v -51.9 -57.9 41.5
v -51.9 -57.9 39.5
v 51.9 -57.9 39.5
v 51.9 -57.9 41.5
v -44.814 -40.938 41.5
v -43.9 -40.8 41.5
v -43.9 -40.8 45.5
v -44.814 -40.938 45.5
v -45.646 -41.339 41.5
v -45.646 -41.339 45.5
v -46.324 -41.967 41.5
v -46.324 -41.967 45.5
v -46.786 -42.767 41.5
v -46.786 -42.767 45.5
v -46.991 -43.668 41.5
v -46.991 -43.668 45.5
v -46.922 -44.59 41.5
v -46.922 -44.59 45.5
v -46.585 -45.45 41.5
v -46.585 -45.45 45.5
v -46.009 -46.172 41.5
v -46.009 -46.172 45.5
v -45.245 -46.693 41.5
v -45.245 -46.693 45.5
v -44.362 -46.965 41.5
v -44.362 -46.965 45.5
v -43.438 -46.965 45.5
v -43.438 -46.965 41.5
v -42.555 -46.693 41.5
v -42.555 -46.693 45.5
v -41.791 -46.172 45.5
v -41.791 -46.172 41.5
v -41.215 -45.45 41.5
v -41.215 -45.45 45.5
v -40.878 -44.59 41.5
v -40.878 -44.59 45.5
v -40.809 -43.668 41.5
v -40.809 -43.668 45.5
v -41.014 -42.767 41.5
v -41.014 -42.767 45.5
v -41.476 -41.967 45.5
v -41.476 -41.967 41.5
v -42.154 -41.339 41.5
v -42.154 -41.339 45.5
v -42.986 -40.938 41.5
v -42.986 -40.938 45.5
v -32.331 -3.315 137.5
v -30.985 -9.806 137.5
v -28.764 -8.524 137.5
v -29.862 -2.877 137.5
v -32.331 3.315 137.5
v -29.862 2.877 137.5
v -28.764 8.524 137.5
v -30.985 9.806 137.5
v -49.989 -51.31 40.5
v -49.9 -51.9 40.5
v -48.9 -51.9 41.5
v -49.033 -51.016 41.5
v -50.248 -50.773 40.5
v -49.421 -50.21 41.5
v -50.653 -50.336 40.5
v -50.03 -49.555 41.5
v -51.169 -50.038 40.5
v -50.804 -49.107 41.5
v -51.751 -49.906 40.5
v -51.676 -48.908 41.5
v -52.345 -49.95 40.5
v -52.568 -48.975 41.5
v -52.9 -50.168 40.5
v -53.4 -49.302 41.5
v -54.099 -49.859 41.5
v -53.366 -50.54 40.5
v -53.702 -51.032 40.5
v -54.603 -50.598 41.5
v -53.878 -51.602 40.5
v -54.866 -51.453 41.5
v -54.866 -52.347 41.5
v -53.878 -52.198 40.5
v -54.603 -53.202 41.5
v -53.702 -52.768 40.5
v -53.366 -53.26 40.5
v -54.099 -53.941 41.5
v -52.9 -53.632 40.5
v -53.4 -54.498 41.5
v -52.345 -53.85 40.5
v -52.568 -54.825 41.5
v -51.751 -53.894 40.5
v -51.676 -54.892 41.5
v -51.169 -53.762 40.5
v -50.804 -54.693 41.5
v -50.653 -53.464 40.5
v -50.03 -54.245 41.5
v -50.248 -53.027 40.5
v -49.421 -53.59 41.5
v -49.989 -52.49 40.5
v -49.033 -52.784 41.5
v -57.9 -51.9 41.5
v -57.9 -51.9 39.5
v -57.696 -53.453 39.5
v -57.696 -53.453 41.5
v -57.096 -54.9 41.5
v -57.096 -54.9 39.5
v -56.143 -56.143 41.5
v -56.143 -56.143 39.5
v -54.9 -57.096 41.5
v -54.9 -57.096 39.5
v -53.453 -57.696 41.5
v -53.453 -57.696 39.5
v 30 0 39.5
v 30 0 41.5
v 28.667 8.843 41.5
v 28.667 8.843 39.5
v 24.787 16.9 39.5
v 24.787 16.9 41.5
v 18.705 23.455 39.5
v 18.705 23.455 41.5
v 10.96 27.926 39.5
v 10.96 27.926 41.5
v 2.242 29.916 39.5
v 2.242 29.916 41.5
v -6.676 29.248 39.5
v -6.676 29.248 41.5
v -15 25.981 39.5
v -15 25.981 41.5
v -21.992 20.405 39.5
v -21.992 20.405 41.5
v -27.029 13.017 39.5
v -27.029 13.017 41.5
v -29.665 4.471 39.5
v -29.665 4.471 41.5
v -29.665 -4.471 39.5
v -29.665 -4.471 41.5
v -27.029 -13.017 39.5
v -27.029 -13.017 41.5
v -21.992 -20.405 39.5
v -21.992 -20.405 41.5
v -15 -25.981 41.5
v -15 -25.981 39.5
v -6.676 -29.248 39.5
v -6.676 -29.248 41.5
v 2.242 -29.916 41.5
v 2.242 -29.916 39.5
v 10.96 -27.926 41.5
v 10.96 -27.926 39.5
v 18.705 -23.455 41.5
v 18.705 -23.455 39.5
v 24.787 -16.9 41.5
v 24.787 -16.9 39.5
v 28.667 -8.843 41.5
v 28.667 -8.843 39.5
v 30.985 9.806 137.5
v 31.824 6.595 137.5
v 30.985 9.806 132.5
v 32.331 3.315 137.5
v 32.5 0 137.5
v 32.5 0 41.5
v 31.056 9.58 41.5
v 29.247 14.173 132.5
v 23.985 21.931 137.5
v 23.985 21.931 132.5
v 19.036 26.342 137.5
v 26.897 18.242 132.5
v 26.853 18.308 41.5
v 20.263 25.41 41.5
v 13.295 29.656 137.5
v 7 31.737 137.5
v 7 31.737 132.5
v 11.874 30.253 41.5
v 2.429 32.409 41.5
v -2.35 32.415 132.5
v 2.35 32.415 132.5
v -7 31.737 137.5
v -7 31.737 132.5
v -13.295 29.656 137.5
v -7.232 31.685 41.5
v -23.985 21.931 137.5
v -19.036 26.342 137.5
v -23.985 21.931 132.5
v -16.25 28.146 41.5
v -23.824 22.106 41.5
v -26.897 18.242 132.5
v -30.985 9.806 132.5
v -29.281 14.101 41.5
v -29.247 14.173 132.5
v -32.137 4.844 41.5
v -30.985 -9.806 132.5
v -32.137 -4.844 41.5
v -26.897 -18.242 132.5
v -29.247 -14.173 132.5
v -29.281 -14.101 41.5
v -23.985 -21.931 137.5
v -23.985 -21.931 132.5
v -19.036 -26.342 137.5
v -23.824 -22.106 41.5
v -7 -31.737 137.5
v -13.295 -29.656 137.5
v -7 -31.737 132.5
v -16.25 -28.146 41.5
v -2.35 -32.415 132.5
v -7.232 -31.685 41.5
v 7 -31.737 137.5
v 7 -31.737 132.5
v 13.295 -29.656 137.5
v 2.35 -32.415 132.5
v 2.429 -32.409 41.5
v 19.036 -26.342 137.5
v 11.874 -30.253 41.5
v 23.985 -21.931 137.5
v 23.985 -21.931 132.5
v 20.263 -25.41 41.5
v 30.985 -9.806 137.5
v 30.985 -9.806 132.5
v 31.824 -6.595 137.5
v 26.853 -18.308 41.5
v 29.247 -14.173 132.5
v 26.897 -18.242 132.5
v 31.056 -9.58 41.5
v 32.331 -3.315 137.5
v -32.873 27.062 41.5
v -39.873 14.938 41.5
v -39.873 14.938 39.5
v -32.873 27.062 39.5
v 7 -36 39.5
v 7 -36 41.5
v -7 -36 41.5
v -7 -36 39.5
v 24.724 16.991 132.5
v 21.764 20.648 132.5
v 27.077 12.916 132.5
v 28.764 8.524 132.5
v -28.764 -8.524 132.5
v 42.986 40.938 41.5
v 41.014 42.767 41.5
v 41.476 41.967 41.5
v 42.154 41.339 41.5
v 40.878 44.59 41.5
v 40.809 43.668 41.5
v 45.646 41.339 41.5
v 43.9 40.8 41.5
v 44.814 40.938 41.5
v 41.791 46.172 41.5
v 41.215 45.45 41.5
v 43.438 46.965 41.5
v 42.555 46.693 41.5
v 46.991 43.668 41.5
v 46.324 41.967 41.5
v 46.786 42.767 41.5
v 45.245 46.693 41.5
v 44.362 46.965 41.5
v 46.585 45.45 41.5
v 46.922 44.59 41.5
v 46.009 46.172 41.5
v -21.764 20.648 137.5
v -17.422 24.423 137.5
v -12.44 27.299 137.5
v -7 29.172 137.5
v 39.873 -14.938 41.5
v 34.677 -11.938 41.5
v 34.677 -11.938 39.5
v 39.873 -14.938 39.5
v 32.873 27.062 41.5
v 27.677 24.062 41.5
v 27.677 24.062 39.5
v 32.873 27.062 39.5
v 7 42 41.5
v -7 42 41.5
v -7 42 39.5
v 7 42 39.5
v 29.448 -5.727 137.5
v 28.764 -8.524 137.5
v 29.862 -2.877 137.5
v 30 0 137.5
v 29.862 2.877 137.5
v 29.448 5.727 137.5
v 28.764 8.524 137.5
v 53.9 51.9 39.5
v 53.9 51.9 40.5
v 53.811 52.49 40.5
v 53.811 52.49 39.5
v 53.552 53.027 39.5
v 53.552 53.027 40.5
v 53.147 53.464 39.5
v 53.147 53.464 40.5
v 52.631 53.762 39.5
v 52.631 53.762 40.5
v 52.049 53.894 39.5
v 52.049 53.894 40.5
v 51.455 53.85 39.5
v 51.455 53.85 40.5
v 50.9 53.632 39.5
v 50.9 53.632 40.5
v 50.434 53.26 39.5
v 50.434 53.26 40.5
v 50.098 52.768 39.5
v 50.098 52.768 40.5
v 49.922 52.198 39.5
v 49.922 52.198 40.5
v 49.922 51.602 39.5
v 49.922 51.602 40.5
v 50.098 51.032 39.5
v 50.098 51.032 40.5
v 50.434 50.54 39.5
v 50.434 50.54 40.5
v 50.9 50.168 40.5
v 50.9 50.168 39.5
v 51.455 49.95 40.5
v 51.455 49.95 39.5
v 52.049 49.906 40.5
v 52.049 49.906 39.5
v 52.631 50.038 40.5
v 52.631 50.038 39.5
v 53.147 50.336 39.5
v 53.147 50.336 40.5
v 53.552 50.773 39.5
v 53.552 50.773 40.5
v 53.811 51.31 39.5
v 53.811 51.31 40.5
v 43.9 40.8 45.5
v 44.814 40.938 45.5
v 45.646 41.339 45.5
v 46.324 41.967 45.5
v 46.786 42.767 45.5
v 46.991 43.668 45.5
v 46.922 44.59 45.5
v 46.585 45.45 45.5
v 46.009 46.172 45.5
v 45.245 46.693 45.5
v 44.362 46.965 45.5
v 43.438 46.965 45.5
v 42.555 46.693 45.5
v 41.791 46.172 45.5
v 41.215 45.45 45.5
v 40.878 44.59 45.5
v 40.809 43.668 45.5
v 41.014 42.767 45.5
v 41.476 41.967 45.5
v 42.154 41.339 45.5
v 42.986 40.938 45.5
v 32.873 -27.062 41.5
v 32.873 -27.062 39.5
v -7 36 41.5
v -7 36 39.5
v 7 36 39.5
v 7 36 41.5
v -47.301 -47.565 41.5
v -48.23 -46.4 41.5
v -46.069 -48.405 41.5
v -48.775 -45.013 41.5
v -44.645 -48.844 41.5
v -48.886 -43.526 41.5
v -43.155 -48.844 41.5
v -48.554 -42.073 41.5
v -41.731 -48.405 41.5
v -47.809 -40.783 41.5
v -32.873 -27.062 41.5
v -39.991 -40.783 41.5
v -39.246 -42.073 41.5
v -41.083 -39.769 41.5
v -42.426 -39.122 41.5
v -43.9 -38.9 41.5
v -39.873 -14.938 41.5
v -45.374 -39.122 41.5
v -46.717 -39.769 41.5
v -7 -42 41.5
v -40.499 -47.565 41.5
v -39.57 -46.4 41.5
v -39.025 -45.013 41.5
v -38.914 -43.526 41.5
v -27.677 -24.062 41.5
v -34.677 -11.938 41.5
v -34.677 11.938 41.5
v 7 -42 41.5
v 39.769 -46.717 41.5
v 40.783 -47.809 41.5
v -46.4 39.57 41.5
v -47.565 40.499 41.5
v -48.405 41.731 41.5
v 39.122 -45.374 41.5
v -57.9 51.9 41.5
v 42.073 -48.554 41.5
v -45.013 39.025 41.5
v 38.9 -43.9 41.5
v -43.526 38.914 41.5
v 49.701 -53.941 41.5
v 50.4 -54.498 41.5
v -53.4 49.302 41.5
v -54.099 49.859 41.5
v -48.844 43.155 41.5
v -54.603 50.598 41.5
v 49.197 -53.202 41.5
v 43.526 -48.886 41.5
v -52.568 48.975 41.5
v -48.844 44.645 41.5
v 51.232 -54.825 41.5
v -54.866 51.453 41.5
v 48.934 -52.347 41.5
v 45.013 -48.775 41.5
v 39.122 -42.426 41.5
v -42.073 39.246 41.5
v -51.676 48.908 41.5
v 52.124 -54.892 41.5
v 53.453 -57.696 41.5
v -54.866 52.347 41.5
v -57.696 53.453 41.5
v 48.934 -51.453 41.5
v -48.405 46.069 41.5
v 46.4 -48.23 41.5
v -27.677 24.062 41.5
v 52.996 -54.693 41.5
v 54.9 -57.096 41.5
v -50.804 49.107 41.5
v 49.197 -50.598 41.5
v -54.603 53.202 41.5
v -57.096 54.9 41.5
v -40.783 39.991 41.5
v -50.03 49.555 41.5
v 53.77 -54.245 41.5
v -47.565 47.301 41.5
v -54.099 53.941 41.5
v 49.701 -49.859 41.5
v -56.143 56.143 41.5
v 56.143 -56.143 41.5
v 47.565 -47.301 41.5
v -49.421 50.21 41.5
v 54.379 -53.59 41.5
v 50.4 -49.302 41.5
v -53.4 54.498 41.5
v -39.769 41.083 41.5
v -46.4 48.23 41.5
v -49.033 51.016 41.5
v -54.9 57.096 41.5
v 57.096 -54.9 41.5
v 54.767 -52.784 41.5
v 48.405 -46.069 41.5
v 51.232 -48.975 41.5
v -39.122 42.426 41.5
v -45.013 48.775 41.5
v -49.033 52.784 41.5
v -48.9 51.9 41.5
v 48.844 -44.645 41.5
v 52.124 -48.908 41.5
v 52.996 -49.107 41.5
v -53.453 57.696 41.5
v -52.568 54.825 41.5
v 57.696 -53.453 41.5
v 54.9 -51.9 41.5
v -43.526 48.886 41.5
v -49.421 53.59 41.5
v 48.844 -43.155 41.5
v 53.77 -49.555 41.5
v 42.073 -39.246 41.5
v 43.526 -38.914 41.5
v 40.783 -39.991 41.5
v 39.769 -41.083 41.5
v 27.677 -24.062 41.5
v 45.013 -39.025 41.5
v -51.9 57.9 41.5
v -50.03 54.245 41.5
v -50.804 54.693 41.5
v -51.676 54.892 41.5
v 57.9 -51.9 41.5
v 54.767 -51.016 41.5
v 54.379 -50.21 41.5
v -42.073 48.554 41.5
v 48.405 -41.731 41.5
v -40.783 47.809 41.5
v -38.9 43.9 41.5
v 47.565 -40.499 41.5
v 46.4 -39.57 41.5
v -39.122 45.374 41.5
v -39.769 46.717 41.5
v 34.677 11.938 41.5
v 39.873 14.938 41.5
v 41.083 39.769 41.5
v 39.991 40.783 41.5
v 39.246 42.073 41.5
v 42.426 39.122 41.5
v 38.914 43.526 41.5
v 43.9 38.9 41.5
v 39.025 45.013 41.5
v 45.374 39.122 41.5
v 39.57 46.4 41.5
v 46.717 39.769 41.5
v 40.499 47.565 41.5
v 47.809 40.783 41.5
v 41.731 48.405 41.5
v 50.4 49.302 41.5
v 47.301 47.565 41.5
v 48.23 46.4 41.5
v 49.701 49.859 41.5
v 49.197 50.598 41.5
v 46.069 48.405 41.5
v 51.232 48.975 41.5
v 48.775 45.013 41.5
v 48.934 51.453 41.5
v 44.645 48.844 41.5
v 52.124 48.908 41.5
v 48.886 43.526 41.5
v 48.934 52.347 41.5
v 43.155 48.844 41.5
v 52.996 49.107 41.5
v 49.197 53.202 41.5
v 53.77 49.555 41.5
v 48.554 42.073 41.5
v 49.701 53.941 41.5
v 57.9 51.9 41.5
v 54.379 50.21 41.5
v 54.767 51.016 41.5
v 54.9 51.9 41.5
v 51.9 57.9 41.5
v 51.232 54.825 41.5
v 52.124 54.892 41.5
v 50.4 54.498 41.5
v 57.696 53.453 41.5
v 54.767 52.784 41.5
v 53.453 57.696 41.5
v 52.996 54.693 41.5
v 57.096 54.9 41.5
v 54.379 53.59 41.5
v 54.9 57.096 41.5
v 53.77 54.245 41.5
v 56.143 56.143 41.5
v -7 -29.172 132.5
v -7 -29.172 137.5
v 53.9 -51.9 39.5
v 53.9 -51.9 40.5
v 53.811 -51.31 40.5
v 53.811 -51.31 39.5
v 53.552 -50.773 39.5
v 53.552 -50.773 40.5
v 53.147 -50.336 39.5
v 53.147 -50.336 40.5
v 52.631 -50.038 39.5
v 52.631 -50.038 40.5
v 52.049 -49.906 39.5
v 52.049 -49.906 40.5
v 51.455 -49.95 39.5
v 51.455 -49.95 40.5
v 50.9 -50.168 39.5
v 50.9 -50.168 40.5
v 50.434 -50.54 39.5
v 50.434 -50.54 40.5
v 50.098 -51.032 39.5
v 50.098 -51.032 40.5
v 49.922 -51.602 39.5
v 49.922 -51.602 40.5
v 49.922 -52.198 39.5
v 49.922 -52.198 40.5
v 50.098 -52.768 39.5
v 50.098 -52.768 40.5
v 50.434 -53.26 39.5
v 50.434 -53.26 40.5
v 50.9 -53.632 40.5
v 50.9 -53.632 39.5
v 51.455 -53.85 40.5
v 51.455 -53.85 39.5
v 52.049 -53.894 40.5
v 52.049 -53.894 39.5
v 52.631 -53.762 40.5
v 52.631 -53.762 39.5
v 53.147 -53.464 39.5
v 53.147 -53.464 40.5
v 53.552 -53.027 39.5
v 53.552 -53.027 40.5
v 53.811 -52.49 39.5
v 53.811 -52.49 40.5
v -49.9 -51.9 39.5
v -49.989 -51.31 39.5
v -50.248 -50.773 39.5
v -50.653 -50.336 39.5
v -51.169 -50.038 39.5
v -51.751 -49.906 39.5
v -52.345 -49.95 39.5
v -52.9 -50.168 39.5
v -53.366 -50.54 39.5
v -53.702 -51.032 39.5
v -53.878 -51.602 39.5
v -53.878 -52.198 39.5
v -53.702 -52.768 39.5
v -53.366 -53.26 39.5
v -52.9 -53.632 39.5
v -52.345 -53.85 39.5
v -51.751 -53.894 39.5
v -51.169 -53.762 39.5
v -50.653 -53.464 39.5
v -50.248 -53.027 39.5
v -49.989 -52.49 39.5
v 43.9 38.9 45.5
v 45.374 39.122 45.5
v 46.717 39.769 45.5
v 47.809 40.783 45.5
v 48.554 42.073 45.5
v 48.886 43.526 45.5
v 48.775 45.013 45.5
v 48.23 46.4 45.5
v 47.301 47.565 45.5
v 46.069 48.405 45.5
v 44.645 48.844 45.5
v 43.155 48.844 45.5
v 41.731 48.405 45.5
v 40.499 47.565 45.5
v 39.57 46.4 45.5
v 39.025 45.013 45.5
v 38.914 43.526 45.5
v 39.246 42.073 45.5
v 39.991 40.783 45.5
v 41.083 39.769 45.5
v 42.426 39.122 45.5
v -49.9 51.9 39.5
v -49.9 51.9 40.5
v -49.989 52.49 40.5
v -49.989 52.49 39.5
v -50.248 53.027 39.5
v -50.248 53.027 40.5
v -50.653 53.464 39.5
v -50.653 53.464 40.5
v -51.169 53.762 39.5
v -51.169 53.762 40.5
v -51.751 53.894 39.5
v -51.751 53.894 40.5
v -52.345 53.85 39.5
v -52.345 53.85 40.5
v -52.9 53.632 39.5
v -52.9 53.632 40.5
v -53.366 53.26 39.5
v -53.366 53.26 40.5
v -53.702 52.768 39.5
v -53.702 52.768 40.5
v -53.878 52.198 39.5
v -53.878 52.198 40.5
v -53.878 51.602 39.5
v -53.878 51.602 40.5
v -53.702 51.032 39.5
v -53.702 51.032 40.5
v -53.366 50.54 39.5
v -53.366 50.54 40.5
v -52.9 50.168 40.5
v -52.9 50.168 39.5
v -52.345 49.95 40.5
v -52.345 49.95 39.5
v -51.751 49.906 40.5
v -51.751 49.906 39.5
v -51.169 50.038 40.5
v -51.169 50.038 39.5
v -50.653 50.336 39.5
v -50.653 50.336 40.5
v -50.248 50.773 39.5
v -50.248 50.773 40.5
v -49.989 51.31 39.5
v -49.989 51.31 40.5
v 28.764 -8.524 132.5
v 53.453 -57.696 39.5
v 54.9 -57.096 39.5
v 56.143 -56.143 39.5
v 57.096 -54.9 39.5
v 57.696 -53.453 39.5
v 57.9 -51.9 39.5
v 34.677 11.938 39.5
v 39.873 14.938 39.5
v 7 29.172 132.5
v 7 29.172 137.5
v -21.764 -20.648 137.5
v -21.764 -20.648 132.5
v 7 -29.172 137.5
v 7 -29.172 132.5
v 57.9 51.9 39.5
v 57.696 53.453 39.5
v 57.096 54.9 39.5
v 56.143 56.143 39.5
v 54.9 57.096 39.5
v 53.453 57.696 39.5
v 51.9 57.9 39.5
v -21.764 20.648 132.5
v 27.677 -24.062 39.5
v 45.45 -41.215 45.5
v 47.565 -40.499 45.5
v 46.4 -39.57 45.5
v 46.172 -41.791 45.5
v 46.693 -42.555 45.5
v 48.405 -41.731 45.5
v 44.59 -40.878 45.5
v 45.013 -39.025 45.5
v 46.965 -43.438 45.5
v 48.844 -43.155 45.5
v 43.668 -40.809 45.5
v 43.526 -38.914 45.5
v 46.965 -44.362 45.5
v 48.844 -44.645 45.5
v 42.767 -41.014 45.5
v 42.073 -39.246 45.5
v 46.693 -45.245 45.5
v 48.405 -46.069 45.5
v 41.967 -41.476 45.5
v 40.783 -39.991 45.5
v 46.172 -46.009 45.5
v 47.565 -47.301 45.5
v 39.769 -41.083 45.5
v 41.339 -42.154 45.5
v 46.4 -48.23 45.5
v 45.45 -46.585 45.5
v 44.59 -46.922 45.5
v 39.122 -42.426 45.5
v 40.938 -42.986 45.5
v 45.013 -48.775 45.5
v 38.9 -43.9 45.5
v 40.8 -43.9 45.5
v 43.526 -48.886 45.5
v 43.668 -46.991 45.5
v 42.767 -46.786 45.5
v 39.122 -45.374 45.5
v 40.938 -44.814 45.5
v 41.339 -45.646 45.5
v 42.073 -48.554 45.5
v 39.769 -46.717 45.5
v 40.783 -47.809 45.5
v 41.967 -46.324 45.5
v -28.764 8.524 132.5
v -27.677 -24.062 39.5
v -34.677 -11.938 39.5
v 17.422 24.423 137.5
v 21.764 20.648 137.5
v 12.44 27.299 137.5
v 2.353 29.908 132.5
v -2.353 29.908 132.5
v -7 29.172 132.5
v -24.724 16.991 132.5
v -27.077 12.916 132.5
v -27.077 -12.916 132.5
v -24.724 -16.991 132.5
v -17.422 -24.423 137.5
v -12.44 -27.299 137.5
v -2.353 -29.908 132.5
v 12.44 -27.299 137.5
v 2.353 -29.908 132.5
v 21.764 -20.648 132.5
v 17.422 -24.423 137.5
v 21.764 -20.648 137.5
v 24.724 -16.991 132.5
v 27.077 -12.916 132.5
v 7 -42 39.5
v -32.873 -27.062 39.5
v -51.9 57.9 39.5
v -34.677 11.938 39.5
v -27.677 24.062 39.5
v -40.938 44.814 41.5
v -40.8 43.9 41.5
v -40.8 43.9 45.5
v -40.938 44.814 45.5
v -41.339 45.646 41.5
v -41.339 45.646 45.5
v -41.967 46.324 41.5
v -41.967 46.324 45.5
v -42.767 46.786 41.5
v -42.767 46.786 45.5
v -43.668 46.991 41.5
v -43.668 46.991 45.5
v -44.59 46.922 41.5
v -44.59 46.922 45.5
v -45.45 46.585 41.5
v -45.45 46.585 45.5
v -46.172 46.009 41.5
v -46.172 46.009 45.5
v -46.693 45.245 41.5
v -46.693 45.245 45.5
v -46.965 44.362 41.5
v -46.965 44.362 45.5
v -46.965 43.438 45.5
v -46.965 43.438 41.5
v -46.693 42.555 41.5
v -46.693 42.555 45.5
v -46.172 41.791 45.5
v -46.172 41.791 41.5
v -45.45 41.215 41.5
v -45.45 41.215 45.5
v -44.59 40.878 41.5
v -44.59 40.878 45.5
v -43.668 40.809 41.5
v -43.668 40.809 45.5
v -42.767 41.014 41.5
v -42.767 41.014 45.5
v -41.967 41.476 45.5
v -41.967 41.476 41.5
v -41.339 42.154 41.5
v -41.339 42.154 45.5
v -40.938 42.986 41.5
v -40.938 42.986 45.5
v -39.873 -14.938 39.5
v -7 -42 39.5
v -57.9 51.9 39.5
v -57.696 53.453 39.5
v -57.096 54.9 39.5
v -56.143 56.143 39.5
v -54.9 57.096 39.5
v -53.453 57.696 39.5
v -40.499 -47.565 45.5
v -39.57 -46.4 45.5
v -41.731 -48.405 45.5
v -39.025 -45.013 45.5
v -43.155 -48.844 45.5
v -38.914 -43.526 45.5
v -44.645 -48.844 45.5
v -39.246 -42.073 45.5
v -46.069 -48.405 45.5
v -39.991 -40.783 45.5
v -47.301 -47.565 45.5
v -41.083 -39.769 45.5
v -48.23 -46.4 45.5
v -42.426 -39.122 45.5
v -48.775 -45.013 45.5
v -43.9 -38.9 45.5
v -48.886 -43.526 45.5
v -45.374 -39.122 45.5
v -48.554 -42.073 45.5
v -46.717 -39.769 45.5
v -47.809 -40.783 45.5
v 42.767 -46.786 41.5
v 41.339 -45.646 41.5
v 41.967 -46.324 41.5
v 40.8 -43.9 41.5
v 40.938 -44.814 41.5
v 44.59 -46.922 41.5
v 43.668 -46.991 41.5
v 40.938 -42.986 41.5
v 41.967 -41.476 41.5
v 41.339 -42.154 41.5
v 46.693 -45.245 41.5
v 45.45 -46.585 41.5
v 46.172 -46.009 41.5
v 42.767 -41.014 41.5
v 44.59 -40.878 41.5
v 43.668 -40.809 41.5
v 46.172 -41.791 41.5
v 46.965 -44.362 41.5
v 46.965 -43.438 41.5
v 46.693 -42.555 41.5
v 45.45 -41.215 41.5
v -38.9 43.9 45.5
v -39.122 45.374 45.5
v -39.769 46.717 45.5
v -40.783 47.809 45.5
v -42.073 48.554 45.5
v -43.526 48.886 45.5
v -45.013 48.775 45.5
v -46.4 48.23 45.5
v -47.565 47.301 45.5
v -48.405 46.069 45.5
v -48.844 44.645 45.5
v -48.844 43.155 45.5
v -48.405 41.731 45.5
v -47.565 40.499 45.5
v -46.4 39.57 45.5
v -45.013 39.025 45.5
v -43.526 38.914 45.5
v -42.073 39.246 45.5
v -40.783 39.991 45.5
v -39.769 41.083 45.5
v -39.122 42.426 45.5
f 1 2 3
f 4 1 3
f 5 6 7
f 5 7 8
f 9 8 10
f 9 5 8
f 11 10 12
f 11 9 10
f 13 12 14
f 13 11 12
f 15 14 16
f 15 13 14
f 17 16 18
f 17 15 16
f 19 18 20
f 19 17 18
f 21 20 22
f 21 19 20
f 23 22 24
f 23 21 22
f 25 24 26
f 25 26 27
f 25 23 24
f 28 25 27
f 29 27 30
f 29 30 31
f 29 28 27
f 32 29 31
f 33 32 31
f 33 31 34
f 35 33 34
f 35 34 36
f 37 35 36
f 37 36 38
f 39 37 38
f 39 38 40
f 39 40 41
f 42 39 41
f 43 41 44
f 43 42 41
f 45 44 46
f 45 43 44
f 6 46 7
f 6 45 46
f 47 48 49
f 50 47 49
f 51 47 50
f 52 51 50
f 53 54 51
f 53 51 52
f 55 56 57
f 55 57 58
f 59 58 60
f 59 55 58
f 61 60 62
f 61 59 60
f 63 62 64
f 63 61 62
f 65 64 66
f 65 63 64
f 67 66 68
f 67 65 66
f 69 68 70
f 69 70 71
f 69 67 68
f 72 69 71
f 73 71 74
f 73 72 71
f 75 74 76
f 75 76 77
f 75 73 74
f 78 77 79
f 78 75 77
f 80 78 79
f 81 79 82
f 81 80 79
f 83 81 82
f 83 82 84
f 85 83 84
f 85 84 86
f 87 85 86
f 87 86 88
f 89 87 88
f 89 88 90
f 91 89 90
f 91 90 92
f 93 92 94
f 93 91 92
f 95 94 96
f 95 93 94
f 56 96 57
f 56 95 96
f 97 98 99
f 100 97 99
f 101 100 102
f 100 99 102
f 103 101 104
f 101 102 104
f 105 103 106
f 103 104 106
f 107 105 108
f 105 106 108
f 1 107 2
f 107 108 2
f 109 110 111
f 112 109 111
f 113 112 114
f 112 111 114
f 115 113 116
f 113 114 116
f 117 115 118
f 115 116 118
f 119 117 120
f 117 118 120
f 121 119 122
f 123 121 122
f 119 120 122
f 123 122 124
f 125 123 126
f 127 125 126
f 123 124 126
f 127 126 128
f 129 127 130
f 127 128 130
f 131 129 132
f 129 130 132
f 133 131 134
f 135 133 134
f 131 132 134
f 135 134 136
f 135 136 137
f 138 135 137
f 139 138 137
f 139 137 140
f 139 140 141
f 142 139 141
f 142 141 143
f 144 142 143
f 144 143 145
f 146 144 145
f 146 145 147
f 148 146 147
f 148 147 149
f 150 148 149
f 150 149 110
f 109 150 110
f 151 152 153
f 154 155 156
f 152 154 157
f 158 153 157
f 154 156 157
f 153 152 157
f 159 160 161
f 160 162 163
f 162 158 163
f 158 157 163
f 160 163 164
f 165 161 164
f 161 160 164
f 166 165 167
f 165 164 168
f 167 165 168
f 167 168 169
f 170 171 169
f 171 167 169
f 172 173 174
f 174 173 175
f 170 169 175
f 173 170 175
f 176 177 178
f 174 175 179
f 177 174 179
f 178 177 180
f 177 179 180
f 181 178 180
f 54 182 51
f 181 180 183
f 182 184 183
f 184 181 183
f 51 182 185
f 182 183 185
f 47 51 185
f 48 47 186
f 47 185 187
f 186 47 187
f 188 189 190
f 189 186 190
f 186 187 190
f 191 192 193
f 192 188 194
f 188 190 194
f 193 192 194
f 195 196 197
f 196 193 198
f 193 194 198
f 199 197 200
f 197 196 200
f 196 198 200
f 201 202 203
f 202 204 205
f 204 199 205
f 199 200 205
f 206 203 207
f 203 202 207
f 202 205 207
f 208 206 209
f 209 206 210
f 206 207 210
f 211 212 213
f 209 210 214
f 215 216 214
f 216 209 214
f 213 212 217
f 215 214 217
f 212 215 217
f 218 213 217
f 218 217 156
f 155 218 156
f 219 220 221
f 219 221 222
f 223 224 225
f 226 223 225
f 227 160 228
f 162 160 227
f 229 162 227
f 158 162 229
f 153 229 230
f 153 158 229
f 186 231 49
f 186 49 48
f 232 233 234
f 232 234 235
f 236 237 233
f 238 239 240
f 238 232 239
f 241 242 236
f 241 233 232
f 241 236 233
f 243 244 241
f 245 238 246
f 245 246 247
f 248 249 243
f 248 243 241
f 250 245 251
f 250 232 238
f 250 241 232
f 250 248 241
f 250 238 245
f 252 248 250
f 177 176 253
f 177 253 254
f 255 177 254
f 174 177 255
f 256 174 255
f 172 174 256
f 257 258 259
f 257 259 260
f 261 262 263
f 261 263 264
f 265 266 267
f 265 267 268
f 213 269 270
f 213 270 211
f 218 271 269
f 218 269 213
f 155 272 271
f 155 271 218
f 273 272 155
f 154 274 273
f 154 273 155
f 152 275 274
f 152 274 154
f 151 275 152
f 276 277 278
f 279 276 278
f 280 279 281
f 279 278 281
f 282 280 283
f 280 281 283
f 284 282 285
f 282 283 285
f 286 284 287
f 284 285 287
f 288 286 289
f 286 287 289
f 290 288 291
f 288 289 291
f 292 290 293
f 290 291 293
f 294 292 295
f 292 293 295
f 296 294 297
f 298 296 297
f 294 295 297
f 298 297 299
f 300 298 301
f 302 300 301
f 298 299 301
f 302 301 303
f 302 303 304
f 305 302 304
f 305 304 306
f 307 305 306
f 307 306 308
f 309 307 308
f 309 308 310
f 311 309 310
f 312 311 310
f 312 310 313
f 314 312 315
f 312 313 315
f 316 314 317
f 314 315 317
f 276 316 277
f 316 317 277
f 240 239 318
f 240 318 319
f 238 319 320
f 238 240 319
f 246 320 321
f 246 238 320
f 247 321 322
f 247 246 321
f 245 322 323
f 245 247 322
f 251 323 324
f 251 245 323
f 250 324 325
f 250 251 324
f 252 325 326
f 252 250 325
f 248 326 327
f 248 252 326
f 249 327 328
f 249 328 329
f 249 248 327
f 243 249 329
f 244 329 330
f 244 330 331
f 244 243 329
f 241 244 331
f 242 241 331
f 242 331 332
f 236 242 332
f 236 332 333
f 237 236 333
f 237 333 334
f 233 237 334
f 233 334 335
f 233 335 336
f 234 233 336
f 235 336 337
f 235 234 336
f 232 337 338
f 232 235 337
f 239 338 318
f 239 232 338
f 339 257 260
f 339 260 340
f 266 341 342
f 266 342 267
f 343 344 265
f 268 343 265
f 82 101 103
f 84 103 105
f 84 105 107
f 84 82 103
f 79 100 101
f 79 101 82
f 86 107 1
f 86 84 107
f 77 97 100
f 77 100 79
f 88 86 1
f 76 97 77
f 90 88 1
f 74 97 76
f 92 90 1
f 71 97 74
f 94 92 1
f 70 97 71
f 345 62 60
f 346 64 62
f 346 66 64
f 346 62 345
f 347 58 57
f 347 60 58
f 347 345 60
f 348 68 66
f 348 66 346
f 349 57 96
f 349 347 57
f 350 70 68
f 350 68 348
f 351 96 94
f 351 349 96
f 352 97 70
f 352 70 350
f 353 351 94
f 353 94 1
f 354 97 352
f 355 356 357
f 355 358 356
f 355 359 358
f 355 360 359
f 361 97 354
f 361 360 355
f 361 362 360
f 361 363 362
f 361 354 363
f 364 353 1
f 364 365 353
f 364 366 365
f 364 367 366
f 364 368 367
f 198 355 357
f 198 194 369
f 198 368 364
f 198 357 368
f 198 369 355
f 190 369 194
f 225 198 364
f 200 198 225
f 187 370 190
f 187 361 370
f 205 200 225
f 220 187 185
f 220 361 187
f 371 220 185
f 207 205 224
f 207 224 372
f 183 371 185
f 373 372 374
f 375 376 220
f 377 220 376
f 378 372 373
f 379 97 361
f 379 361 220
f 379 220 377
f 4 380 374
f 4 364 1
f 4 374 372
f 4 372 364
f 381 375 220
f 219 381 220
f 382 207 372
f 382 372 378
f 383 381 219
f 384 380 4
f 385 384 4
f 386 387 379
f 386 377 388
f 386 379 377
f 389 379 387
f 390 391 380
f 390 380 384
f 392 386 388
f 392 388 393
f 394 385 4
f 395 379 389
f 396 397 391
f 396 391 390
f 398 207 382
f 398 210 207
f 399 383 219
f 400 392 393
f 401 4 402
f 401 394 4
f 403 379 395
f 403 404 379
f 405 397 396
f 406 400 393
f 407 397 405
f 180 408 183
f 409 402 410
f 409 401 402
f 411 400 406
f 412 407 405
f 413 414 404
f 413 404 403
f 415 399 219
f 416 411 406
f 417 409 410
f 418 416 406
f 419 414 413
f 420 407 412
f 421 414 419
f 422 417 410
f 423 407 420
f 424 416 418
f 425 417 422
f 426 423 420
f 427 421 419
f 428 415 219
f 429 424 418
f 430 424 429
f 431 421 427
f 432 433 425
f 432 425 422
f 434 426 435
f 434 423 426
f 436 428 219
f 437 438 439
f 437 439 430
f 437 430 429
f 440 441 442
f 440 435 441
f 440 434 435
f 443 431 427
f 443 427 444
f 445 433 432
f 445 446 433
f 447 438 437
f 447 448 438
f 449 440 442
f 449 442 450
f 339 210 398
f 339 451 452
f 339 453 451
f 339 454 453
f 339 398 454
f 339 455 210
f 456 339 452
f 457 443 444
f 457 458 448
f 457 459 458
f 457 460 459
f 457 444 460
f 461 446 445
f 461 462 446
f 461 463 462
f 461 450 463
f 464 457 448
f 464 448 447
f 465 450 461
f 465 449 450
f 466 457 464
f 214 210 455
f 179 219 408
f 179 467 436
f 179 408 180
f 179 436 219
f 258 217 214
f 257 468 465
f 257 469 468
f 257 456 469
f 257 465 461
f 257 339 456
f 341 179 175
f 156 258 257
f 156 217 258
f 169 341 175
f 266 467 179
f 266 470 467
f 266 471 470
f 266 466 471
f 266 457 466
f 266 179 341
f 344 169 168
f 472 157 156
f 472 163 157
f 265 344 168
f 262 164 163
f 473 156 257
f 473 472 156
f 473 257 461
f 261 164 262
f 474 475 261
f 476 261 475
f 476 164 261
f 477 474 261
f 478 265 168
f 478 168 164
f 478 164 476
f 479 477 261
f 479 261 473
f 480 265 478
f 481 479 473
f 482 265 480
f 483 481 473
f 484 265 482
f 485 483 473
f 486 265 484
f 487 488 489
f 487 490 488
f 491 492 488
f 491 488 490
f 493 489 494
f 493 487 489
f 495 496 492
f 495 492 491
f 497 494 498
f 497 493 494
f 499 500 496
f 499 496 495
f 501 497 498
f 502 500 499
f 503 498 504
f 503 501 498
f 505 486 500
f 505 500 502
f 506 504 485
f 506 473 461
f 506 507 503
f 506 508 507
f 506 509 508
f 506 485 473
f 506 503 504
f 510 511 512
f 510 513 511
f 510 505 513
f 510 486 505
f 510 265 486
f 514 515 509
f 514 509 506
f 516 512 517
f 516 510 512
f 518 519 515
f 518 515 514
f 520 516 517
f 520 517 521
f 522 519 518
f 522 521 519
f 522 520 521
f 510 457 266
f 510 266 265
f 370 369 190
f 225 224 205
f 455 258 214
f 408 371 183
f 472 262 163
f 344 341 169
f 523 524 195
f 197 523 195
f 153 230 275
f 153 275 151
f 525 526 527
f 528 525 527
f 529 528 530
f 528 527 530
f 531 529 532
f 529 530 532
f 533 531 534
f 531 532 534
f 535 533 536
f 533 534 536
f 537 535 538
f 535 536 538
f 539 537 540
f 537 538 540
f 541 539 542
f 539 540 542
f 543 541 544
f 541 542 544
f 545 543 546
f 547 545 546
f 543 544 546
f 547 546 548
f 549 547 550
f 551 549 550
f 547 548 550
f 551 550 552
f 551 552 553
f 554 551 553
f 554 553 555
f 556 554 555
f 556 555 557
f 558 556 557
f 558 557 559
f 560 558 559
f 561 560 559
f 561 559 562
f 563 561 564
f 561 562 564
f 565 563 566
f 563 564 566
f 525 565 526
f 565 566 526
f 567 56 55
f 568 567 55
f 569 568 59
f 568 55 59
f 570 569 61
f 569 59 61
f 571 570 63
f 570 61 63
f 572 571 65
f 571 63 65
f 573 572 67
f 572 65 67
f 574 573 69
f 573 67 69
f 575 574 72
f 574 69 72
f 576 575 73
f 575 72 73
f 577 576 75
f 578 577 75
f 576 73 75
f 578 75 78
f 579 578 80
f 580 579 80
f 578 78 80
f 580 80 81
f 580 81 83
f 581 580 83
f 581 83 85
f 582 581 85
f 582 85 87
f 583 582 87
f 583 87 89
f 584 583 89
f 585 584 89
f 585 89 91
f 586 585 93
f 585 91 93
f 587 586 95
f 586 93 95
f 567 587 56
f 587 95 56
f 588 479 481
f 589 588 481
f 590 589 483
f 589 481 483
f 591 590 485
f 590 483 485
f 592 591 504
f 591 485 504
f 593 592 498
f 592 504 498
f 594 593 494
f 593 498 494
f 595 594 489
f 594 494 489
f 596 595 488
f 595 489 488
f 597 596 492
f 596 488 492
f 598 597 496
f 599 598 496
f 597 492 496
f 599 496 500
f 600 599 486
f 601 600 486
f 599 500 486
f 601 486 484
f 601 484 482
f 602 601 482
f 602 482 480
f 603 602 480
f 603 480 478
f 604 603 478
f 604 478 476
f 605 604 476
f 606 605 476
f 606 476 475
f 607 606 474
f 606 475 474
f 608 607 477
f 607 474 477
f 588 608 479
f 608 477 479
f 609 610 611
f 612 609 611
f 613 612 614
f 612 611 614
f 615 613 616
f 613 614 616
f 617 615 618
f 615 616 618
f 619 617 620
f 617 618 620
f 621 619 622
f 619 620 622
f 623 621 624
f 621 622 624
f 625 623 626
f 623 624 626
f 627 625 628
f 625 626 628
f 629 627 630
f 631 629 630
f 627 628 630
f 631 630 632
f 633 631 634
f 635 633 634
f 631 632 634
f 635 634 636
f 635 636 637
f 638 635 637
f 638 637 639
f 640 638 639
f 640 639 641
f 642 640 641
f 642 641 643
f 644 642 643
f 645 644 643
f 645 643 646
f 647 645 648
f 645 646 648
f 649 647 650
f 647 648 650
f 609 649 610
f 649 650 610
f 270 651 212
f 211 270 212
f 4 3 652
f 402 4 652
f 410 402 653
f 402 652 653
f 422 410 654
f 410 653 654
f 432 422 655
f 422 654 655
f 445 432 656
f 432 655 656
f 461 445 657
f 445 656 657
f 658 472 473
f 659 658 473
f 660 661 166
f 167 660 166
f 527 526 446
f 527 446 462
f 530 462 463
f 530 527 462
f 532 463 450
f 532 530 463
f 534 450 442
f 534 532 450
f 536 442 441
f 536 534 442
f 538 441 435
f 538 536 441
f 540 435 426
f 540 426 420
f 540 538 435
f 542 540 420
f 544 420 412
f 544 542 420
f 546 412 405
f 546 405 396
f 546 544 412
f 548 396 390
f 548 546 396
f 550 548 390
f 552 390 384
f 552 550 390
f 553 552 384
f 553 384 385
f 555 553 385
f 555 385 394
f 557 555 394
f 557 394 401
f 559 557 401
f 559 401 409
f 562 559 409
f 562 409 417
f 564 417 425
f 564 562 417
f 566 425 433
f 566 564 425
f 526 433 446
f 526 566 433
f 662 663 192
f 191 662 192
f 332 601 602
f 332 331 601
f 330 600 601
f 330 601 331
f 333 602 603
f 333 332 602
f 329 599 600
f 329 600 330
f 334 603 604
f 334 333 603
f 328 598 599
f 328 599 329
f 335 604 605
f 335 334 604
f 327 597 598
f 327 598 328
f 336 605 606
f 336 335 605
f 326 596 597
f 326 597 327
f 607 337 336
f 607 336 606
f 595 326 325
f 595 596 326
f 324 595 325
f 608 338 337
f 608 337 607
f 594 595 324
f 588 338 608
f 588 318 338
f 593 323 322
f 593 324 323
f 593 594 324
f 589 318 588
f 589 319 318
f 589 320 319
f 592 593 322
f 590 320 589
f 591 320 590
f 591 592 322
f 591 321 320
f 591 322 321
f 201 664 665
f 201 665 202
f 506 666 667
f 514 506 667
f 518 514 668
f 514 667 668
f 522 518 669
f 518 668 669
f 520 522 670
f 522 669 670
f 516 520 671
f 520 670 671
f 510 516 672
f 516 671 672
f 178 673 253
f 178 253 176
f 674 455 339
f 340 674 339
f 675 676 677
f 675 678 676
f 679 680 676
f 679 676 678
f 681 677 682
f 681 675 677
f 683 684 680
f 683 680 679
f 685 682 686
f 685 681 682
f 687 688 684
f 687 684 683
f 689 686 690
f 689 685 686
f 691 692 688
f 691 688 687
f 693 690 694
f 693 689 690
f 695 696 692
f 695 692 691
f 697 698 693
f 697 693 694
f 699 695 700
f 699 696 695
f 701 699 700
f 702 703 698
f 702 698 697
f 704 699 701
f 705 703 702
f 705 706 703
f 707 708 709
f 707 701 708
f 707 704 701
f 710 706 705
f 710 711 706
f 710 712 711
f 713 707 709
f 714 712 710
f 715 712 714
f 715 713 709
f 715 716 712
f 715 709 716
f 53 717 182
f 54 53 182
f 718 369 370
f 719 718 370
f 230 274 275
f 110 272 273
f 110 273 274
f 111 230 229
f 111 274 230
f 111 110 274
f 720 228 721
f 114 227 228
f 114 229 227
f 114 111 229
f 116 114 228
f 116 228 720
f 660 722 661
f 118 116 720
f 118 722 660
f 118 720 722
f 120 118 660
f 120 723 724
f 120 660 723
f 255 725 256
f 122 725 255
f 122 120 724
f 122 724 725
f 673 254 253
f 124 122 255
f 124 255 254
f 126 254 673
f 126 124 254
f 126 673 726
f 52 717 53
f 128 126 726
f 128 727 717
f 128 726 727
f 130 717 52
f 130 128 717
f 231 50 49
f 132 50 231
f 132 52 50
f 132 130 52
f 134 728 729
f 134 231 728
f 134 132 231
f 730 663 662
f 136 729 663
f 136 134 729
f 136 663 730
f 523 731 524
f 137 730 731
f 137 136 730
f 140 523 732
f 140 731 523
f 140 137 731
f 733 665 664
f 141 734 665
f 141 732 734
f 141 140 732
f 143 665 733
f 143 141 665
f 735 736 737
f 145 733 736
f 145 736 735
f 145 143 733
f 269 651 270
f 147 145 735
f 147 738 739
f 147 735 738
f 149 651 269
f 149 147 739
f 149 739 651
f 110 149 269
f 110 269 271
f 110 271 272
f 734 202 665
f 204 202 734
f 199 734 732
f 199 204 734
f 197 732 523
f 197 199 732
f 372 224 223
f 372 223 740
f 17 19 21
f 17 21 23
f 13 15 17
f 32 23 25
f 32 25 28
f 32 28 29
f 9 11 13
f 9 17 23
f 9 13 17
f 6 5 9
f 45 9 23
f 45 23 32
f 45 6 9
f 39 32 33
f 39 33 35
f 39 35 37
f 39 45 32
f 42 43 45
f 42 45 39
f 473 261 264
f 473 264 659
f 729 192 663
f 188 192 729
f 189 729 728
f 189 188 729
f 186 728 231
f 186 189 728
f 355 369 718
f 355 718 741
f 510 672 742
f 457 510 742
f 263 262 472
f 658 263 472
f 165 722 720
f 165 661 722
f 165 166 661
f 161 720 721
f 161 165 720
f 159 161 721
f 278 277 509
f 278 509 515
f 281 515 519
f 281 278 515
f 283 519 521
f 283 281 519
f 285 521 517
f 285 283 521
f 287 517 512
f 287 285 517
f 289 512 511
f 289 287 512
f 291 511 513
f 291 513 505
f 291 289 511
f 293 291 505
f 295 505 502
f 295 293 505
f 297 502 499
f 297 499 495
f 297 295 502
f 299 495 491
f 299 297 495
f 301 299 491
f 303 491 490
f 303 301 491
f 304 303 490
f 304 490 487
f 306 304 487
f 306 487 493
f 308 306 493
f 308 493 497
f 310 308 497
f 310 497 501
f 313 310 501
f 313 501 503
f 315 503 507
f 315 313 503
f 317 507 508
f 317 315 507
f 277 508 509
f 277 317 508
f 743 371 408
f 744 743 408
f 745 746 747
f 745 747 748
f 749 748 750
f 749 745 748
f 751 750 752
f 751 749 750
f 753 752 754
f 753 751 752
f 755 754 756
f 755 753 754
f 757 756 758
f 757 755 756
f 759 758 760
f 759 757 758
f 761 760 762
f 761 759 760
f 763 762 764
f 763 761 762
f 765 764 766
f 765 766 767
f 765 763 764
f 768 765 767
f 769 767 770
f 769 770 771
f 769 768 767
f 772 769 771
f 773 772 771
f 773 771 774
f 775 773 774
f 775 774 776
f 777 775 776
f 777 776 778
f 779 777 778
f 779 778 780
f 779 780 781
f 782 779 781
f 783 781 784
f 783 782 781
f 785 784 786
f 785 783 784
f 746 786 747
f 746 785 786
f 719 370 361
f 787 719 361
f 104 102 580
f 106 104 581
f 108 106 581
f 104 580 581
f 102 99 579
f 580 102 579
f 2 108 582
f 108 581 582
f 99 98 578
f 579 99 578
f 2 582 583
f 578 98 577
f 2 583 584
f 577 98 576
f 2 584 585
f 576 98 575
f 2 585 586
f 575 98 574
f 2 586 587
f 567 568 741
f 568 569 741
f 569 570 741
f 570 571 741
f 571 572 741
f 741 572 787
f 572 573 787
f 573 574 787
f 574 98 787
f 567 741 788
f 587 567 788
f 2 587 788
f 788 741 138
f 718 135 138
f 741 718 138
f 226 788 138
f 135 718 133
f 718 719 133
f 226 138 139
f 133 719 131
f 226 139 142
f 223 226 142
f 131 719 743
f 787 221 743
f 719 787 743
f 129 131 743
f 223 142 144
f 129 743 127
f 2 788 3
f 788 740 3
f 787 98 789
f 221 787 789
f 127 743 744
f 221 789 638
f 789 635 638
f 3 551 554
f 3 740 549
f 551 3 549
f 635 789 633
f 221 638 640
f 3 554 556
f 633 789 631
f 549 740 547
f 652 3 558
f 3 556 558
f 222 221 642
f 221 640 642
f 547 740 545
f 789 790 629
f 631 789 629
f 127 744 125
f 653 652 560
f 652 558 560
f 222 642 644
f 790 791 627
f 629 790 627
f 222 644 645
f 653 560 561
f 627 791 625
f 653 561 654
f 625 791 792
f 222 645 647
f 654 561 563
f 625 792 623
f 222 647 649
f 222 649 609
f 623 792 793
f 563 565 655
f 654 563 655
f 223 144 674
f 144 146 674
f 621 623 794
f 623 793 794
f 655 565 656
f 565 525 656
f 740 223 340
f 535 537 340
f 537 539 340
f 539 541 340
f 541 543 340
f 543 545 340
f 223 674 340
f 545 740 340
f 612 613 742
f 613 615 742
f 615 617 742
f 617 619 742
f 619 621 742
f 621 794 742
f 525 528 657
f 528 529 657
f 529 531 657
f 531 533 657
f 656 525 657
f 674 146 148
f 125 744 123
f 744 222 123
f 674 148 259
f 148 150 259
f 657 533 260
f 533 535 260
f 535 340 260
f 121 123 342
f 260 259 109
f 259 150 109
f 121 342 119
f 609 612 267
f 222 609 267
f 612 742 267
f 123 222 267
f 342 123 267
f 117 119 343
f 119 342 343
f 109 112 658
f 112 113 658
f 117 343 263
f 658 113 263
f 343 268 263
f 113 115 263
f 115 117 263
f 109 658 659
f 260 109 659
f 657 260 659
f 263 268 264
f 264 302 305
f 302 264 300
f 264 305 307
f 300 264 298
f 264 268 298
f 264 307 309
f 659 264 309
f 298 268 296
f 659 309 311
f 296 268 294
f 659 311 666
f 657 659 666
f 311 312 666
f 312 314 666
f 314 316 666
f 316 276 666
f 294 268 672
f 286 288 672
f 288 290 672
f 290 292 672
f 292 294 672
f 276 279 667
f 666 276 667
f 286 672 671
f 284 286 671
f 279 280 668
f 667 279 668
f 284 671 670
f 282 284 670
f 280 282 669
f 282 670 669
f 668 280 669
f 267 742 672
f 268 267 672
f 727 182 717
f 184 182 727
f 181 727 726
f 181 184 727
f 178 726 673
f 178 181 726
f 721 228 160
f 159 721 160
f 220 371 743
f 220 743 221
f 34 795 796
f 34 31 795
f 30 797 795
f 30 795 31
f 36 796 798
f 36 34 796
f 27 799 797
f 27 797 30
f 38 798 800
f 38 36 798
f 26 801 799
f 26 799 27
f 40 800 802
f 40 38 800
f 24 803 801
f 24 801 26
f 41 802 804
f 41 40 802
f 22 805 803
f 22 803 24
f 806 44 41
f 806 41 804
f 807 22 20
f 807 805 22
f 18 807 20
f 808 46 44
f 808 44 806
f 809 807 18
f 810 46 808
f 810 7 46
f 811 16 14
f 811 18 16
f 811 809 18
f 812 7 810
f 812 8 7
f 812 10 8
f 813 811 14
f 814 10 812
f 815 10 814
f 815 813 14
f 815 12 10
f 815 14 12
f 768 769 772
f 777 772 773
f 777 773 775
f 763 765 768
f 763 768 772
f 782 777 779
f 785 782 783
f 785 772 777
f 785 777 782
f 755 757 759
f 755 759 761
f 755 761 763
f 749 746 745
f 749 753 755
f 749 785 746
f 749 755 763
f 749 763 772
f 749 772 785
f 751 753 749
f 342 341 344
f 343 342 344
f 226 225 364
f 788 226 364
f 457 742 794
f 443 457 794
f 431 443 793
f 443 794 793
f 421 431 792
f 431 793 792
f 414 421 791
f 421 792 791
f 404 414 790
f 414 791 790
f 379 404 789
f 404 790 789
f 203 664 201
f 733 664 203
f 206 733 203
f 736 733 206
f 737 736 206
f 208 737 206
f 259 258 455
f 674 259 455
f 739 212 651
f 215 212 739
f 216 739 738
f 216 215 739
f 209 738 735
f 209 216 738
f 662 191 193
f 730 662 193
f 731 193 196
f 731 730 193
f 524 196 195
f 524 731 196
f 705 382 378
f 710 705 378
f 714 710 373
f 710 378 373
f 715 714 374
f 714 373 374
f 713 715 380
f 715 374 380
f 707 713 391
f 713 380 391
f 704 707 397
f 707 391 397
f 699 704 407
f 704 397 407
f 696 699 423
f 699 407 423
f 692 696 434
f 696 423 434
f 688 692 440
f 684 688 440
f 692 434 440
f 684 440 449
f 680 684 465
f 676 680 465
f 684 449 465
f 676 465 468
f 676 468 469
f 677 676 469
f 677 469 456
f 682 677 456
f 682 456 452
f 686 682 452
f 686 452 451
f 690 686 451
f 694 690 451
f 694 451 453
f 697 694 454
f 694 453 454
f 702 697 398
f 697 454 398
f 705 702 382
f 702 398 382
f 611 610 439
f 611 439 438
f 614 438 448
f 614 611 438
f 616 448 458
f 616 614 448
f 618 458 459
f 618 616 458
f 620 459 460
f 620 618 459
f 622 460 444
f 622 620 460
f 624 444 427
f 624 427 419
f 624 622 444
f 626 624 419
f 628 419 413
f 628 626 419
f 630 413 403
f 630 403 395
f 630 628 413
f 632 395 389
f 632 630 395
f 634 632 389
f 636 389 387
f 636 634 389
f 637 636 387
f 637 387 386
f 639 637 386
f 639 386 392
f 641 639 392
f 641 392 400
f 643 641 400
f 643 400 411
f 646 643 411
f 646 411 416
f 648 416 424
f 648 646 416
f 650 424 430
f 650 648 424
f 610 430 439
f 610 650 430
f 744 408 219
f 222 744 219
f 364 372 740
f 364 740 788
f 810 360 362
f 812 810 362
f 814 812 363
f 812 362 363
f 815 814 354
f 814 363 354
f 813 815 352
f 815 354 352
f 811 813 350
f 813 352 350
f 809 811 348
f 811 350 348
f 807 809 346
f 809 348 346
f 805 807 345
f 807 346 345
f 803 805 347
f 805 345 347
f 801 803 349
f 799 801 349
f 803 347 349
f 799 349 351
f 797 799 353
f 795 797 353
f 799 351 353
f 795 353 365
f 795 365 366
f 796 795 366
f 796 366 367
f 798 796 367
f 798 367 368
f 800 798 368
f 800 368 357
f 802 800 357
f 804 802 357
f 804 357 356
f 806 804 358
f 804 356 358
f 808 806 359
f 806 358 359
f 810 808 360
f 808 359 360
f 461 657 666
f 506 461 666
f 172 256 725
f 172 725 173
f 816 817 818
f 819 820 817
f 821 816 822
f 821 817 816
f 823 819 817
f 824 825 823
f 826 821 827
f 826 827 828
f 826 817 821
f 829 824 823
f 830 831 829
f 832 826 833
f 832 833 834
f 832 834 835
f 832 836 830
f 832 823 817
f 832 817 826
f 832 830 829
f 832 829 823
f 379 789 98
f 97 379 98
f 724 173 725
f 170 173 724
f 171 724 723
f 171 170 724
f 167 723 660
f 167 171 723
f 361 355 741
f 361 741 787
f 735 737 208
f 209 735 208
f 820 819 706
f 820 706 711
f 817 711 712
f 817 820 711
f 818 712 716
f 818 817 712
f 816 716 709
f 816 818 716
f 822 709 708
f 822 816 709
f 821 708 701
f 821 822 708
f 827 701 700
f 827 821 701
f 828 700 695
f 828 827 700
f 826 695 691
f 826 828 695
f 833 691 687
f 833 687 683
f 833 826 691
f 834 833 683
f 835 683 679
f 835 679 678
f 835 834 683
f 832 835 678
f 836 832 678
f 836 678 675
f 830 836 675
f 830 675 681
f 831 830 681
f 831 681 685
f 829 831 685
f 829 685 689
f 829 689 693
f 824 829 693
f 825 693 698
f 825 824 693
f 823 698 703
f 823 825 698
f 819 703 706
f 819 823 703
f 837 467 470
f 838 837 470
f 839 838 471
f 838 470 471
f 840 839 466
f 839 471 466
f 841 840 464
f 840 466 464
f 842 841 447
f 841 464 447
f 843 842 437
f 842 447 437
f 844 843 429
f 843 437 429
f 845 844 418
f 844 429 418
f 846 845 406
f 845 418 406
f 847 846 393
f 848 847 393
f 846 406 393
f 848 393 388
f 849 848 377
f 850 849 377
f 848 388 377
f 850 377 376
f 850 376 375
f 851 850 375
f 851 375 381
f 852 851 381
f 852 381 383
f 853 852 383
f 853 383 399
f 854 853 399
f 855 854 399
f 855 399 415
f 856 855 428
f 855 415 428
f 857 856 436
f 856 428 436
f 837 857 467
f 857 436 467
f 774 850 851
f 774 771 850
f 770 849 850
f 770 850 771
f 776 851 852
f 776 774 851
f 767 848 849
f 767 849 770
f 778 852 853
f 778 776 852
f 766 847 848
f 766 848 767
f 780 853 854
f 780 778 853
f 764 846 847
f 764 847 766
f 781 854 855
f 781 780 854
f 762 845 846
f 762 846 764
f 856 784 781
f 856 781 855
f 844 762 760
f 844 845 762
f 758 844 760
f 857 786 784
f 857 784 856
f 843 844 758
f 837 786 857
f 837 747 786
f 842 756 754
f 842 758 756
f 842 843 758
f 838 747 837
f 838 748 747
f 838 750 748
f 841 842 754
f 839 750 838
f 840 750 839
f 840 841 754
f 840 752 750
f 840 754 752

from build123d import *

# Parameters (mm, degrees)
PAD013_DEPTH          = 2
SKETCH027_R           = 2
POCKET011_DEPTH       = 2
CHAMFER004_SIZE       = 1
SKETCH028_R           = 30
POCKET012_DEPTH       = 5
SKETCH029_R           = 32.5
SKETCH029_R_2         = 30
PAD014_DEPTH          = 96
SKETCH030_W           = 14
SKETCH030_H           = 6
POCKET013_DEPTH       = 5
POLARPATTERN007_COUNT = 6
SKETCH031_W           = 14
SKETCH031_H           = 6
POCKET014_DEPTH       = 5
POLARPATTERN008_COUNT = 6
SKETCH032_R           = 5
SKETCH032_R_2         = 3.1
PAD015_DEPTH          = 4
POLARPATTERN009_COUNT = 4


with BuildPart() as part:
    # Sketch026 → Pad013 (new body)
    with BuildSketch(Plane.XY):
        with BuildLine():
            Line((-51.9, -57.9), (51.9, -57.9))
            ThreePointArc((51.9, -57.9), (56.1426406871, -56.1426406871), (57.9, -51.9))
            Line((57.9, -51.9), (57.9, 51.9))
            ThreePointArc((57.9, 51.9), (56.1426406871, 56.1426406871), (51.9, 57.9))
            Line((51.9, 57.9), (-51.9, 57.9))
            ThreePointArc((-51.9, 57.9), (-56.1426406871, 56.1426406871), (-57.9, 51.9))
            Line((-57.9, 51.9), (-57.9, -51.9))
            ThreePointArc((-57.9, -51.9), (-56.1426406871, -56.1426406871), (-51.9, -57.9))
        make_face()
    extrude(amount=PAD013_DEPTH)

    # Sketch027 (on Face10 of Pad013) → Pocket011 (cut)
    with BuildSketch(Plane.XY.offset(2)):
        with Locations((-51.900002, 51.900002)):
            Circle(SKETCH027_R)
        with Locations((51.9, 51.9)):
            Circle(SKETCH027_R)
        with Locations((51.9, -51.9)):
            Circle(SKETCH027_R)
        with Locations((-51.9, -51.9)):
            Circle(SKETCH027_R)
    extrude(amount=-POCKET011_DEPTH, mode=Mode.SUBTRACT)

    # Chamfer004
    chamfer004_edges = [part.edges().sort_by_distance(p)[0] for p in [
        (-53.9, -51.9, 2),
        (-53.900002, 51.900002, 2),
        (49.9, 51.9, 2),
        (49.9, -51.9, 2),
    ]]
    chamfer(chamfer004_edges, length=CHAMFER004_SIZE)

    # Sketch028 (on Face1 of Chamfer004) → Pocket012 (cut)
    with BuildSketch(Plane.XY.offset(2)):
        Circle(SKETCH028_R)
    extrude(amount=-POCKET012_DEPTH, mode=Mode.SUBTRACT)

    # Sketch029 (on Face1 of Pocket012) → Pad014 (join)
    with BuildSketch(Plane.XY.offset(2)):
        Circle(SKETCH029_R)
        Circle(SKETCH029_R_2, mode=Mode.SUBTRACT)
    extrude(amount=PAD014_DEPTH)

    # Sketch030 (on Face1 of Pad014) → Pocket013 (cut)
    with BuildSketch(Plane.XY.offset(2)):
        with Locations((0, 39)):
            Rectangle(SKETCH030_W, SKETCH030_H)
    pocket013 = extrude(amount=-POCKET013_DEPTH, mode=Mode.SUBTRACT)

    # PolarPattern007: Pocket013 ×6 about axis
    polarpattern007_axis = Axis((0, 0, 2), (0, 0, 1))
    for i in range(1, POLARPATTERN007_COUNT):
        add(pocket013.rotate(polarpattern007_axis, i * 360 / POLARPATTERN007_COUNT), mode=Mode.SUBTRACT)

    # Sketch031 (on Face42 of PolarPattern007) → Pocket014 (cut)
    with BuildSketch(Plane.XY.offset(98)):
        with Locations((0, 31)):
            Rectangle(SKETCH031_W, SKETCH031_H)
    pocket014 = extrude(amount=-POCKET014_DEPTH, mode=Mode.SUBTRACT)

    # PolarPattern008: Pocket014 ×6 about axis
    polarpattern008_axis = Axis((0, 0, 98), (0, 0, 1))
    for i in range(1, POLARPATTERN008_COUNT):
        add(pocket014.rotate(polarpattern008_axis, i * 360 / POLARPATTERN008_COUNT), mode=Mode.SUBTRACT)

    # Sketch032 (on Face1 of PolarPattern008) → Pad015 (join)
    with BuildSketch(Plane.XY.offset(2)):
        with Locations((-43.9, 43.9)):
            Circle(SKETCH032_R)
        with Locations((-43.9, 43.9)):
            Circle(SKETCH032_R_2, mode=Mode.SUBTRACT)
    pad015 = extrude(amount=PAD015_DEPTH)

    # PolarPattern009: Pad015 ×4 about axis
    polarpattern009_axis = Axis((0, 0, 2), (0, 0, 1))
    for i in range(1, POLARPATTERN009_COUNT):
        add(pad015.rotate(polarpattern009_axis, i * 360 / POLARPATTERN009_COUNT))


with BuildPart() as part_1:
    # Body003 placement: moved
    add(part.part.moved(Location((0, 0, 39.5))))


solid = part_1.part
